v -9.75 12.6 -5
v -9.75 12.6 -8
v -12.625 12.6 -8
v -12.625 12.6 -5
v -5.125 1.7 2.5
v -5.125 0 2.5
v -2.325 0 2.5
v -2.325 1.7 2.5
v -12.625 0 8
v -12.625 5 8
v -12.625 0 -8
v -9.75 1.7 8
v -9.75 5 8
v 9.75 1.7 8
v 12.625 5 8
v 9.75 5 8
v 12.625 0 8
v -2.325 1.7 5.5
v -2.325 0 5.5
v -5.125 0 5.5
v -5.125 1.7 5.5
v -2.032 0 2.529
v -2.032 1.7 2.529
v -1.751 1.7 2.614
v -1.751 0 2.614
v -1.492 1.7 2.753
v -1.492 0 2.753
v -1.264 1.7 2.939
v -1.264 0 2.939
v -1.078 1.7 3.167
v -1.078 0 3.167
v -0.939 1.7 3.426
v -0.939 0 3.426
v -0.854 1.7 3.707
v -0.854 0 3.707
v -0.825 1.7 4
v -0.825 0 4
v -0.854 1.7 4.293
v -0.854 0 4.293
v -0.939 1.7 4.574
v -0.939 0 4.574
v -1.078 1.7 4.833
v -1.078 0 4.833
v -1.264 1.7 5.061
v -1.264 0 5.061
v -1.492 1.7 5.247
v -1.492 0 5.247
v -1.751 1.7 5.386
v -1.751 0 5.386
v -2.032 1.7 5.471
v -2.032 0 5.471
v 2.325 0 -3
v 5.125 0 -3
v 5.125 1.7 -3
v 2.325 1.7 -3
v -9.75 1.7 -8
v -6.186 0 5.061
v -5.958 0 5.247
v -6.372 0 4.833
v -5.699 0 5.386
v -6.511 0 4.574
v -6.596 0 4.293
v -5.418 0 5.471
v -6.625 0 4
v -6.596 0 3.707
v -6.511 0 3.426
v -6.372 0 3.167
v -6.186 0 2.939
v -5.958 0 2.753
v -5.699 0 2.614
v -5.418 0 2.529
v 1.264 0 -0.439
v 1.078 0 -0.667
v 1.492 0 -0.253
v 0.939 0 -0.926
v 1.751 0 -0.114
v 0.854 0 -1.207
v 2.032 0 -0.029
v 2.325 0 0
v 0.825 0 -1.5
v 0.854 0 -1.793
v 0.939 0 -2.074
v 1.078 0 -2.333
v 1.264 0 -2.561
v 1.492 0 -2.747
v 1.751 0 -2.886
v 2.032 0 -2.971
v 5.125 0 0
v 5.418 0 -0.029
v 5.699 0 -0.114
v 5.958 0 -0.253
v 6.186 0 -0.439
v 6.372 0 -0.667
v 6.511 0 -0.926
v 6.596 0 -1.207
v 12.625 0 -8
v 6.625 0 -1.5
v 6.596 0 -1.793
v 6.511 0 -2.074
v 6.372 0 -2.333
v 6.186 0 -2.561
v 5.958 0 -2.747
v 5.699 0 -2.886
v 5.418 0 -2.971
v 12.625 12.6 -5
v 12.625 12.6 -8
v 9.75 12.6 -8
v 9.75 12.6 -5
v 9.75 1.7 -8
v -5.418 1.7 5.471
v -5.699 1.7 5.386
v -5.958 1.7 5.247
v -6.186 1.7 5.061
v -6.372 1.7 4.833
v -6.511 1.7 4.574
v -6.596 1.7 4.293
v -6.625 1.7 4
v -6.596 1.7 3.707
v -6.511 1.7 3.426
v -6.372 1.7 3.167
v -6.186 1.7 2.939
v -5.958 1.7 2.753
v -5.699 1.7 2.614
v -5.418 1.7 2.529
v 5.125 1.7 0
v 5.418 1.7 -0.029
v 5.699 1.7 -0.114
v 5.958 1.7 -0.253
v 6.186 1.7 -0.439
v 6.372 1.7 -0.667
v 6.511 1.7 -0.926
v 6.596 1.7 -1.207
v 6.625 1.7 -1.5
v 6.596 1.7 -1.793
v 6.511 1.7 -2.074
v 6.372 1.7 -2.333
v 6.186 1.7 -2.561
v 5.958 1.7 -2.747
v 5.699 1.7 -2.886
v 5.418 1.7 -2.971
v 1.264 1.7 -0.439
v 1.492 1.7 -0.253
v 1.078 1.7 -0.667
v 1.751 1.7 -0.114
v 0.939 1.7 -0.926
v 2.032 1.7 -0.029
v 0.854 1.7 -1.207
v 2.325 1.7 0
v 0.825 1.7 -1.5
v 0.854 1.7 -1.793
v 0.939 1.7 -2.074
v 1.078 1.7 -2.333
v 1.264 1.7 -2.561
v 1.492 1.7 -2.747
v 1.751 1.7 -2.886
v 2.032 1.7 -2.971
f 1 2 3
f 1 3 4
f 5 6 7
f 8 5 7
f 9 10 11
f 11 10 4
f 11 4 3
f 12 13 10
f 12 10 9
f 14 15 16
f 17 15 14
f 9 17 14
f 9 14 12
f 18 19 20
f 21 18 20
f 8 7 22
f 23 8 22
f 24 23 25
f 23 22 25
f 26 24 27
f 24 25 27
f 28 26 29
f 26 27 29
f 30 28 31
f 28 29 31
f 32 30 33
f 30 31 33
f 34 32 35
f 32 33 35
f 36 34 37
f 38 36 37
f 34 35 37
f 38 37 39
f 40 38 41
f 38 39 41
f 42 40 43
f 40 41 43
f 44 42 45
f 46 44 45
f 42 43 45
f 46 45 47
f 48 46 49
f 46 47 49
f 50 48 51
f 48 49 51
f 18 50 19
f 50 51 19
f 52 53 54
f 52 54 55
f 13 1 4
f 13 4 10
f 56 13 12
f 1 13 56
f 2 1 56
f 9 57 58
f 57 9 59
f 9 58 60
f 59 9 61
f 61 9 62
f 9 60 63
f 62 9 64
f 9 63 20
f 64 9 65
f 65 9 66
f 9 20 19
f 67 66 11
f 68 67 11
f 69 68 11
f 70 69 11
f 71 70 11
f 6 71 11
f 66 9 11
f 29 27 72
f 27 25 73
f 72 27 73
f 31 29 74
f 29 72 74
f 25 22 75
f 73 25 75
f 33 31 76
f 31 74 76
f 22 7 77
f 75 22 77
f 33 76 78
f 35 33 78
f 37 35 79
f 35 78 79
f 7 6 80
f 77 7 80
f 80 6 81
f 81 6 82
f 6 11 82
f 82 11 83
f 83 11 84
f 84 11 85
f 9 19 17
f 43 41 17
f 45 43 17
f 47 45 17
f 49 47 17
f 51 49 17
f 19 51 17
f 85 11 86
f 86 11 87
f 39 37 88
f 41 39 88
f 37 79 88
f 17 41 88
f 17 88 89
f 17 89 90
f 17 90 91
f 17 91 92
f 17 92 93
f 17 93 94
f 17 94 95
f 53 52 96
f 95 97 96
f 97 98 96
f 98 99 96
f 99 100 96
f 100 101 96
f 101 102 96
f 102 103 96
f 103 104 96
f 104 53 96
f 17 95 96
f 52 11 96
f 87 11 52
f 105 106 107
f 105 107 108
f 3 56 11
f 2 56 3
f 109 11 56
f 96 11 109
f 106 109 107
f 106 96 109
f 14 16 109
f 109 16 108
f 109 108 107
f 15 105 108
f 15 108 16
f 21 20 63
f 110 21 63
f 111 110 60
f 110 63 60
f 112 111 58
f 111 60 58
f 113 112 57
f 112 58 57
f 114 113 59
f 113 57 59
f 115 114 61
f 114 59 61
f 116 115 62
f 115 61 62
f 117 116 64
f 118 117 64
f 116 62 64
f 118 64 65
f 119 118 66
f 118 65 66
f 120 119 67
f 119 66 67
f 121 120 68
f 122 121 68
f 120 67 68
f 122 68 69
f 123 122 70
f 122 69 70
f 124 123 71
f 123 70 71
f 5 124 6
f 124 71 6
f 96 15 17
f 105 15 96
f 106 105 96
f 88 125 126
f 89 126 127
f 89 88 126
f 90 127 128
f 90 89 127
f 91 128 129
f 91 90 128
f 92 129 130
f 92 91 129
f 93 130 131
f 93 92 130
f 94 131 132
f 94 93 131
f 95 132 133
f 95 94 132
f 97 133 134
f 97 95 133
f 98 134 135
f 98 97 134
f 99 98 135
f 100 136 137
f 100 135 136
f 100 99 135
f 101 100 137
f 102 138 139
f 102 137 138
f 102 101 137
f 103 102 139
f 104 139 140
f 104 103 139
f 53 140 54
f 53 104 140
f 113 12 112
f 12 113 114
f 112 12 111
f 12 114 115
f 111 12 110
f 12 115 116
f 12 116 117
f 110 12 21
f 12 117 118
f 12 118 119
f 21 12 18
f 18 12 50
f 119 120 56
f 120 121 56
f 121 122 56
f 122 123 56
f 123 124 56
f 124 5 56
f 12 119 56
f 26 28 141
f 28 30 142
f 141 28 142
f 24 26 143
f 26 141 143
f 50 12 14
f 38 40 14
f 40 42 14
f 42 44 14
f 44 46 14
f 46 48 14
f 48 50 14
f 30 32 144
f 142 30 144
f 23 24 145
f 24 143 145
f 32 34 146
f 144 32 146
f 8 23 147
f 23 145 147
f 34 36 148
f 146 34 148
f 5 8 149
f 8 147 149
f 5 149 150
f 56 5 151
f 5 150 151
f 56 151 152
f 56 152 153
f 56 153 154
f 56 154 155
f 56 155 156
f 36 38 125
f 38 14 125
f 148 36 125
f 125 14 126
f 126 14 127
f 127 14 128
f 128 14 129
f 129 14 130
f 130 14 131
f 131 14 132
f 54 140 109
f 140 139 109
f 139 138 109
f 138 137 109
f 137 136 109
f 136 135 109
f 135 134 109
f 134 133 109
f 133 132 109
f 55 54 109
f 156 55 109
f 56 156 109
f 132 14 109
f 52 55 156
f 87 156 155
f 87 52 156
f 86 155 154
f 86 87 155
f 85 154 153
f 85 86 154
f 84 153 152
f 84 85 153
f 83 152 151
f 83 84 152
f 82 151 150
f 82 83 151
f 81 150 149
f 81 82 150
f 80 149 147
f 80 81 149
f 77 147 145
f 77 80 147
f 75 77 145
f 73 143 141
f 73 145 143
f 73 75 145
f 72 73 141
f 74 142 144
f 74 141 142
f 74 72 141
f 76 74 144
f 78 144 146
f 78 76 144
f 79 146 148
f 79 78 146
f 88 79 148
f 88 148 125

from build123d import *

# Parameters (mm, degrees)
SKETCH1_W           = 25.25
SKETCH1_H           = 16
BOSS_EXTRUDE1_DEPTH = 1.7
BOSS_EXTRUDE3_DEPTH = 12.625
CUT_EXTRUDE7_DEPTH  = 9.75
CUT_EXTRUDE8_REACH  = 21.549


with BuildPart() as part:
    # Sketch1 → Boss-Extrude1 (new body)
    with BuildSketch(Plane(origin=(0, 0, 0), x_dir=(1, 0, 0), z_dir=(0, 1, 0))):
        Rectangle(SKETCH1_W, SKETCH1_H)
    extrude(amount=BOSS_EXTRUDE1_DEPTH)

    # Sketch5 → Boss-Extrude3 (add, symmetric)
    with BuildSketch(Plane(origin=(0, 0, 0), x_dir=(0, 0, -1), z_dir=(1, 0, 0))):
        Polygon((-8, 1.7), (8, 1.7), (8, 12.6), (5, 12.6), (-8, 5), align=None)
    extrude(amount=BOSS_EXTRUDE3_DEPTH, both=True)

    # Sketch5<2> → Cut-Extrude7 (cut, symmetric)
    with BuildSketch(Plane(origin=(0, 0, 0), x_dir=(0, 0, -1), z_dir=(1, 0, 0))):
        Polygon((-8, 1.7), (8, 1.7), (8, 12.6), (5, 12.6), (-8, 5), align=None)
    extrude(amount=CUT_EXTRUDE7_DEPTH, both=True, mode=Mode.SUBTRACT)

    # Sketch6 → Cut-Extrude8 (cut, up to next)
    with BuildSketch(Plane(origin=(0, 0, 0), x_dir=(1, 0, 0), z_dir=(0, 1, 0)), mode=Mode.PRIVATE) as cut_extrude8_sk1:
        with BuildLine():
            Line((-5.125, -2.5), (-2.325, -2.5))
            ThreePointArc((-2.325, -2.5), (-0.825, -4), (-2.325, -5.5))
            Line((-2.325, -5.5), (-5.125, -5.5))
            ThreePointArc((-5.125, -5.5), (-6.625, -4), (-5.125, -2.5))
        make_face()
    cut_extrude8_tool1 = extrude(cut_extrude8_sk1.sketch, amount=CUT_EXTRUDE8_REACH, mode=Mode.PRIVATE) & part.part
    # Sketch6 → Cut-Extrude8 (cut, up to next)
    with BuildSketch(Plane(origin=(0, 0, 0), x_dir=(1, 0, 0), z_dir=(0, 1, 0)), mode=Mode.PRIVATE) as cut_extrude8_sk2:
        with BuildLine():
            Line((2.325, 0), (5.125, 0))
            ThreePointArc((5.125, 0), (6.625, 1.5), (5.125, 3))
            Line((5.125, 3), (2.325, 3))
            ThreePointArc((2.325, 3), (0.825, 1.5), (2.325, 0))
        make_face()
    cut_extrude8_tool2 = extrude(cut_extrude8_sk2.sketch, amount=CUT_EXTRUDE8_REACH, mode=Mode.PRIVATE) & part.part
    add(cut_extrude8_tool1.solids().sort_by_distance((-3.725, 0, 4))[0], mode=Mode.SUBTRACT)
    add(cut_extrude8_tool2.solids().sort_by_distance((3.725, 0, -1.5))[0], mode=Mode.SUBTRACT)


solid = part.part
